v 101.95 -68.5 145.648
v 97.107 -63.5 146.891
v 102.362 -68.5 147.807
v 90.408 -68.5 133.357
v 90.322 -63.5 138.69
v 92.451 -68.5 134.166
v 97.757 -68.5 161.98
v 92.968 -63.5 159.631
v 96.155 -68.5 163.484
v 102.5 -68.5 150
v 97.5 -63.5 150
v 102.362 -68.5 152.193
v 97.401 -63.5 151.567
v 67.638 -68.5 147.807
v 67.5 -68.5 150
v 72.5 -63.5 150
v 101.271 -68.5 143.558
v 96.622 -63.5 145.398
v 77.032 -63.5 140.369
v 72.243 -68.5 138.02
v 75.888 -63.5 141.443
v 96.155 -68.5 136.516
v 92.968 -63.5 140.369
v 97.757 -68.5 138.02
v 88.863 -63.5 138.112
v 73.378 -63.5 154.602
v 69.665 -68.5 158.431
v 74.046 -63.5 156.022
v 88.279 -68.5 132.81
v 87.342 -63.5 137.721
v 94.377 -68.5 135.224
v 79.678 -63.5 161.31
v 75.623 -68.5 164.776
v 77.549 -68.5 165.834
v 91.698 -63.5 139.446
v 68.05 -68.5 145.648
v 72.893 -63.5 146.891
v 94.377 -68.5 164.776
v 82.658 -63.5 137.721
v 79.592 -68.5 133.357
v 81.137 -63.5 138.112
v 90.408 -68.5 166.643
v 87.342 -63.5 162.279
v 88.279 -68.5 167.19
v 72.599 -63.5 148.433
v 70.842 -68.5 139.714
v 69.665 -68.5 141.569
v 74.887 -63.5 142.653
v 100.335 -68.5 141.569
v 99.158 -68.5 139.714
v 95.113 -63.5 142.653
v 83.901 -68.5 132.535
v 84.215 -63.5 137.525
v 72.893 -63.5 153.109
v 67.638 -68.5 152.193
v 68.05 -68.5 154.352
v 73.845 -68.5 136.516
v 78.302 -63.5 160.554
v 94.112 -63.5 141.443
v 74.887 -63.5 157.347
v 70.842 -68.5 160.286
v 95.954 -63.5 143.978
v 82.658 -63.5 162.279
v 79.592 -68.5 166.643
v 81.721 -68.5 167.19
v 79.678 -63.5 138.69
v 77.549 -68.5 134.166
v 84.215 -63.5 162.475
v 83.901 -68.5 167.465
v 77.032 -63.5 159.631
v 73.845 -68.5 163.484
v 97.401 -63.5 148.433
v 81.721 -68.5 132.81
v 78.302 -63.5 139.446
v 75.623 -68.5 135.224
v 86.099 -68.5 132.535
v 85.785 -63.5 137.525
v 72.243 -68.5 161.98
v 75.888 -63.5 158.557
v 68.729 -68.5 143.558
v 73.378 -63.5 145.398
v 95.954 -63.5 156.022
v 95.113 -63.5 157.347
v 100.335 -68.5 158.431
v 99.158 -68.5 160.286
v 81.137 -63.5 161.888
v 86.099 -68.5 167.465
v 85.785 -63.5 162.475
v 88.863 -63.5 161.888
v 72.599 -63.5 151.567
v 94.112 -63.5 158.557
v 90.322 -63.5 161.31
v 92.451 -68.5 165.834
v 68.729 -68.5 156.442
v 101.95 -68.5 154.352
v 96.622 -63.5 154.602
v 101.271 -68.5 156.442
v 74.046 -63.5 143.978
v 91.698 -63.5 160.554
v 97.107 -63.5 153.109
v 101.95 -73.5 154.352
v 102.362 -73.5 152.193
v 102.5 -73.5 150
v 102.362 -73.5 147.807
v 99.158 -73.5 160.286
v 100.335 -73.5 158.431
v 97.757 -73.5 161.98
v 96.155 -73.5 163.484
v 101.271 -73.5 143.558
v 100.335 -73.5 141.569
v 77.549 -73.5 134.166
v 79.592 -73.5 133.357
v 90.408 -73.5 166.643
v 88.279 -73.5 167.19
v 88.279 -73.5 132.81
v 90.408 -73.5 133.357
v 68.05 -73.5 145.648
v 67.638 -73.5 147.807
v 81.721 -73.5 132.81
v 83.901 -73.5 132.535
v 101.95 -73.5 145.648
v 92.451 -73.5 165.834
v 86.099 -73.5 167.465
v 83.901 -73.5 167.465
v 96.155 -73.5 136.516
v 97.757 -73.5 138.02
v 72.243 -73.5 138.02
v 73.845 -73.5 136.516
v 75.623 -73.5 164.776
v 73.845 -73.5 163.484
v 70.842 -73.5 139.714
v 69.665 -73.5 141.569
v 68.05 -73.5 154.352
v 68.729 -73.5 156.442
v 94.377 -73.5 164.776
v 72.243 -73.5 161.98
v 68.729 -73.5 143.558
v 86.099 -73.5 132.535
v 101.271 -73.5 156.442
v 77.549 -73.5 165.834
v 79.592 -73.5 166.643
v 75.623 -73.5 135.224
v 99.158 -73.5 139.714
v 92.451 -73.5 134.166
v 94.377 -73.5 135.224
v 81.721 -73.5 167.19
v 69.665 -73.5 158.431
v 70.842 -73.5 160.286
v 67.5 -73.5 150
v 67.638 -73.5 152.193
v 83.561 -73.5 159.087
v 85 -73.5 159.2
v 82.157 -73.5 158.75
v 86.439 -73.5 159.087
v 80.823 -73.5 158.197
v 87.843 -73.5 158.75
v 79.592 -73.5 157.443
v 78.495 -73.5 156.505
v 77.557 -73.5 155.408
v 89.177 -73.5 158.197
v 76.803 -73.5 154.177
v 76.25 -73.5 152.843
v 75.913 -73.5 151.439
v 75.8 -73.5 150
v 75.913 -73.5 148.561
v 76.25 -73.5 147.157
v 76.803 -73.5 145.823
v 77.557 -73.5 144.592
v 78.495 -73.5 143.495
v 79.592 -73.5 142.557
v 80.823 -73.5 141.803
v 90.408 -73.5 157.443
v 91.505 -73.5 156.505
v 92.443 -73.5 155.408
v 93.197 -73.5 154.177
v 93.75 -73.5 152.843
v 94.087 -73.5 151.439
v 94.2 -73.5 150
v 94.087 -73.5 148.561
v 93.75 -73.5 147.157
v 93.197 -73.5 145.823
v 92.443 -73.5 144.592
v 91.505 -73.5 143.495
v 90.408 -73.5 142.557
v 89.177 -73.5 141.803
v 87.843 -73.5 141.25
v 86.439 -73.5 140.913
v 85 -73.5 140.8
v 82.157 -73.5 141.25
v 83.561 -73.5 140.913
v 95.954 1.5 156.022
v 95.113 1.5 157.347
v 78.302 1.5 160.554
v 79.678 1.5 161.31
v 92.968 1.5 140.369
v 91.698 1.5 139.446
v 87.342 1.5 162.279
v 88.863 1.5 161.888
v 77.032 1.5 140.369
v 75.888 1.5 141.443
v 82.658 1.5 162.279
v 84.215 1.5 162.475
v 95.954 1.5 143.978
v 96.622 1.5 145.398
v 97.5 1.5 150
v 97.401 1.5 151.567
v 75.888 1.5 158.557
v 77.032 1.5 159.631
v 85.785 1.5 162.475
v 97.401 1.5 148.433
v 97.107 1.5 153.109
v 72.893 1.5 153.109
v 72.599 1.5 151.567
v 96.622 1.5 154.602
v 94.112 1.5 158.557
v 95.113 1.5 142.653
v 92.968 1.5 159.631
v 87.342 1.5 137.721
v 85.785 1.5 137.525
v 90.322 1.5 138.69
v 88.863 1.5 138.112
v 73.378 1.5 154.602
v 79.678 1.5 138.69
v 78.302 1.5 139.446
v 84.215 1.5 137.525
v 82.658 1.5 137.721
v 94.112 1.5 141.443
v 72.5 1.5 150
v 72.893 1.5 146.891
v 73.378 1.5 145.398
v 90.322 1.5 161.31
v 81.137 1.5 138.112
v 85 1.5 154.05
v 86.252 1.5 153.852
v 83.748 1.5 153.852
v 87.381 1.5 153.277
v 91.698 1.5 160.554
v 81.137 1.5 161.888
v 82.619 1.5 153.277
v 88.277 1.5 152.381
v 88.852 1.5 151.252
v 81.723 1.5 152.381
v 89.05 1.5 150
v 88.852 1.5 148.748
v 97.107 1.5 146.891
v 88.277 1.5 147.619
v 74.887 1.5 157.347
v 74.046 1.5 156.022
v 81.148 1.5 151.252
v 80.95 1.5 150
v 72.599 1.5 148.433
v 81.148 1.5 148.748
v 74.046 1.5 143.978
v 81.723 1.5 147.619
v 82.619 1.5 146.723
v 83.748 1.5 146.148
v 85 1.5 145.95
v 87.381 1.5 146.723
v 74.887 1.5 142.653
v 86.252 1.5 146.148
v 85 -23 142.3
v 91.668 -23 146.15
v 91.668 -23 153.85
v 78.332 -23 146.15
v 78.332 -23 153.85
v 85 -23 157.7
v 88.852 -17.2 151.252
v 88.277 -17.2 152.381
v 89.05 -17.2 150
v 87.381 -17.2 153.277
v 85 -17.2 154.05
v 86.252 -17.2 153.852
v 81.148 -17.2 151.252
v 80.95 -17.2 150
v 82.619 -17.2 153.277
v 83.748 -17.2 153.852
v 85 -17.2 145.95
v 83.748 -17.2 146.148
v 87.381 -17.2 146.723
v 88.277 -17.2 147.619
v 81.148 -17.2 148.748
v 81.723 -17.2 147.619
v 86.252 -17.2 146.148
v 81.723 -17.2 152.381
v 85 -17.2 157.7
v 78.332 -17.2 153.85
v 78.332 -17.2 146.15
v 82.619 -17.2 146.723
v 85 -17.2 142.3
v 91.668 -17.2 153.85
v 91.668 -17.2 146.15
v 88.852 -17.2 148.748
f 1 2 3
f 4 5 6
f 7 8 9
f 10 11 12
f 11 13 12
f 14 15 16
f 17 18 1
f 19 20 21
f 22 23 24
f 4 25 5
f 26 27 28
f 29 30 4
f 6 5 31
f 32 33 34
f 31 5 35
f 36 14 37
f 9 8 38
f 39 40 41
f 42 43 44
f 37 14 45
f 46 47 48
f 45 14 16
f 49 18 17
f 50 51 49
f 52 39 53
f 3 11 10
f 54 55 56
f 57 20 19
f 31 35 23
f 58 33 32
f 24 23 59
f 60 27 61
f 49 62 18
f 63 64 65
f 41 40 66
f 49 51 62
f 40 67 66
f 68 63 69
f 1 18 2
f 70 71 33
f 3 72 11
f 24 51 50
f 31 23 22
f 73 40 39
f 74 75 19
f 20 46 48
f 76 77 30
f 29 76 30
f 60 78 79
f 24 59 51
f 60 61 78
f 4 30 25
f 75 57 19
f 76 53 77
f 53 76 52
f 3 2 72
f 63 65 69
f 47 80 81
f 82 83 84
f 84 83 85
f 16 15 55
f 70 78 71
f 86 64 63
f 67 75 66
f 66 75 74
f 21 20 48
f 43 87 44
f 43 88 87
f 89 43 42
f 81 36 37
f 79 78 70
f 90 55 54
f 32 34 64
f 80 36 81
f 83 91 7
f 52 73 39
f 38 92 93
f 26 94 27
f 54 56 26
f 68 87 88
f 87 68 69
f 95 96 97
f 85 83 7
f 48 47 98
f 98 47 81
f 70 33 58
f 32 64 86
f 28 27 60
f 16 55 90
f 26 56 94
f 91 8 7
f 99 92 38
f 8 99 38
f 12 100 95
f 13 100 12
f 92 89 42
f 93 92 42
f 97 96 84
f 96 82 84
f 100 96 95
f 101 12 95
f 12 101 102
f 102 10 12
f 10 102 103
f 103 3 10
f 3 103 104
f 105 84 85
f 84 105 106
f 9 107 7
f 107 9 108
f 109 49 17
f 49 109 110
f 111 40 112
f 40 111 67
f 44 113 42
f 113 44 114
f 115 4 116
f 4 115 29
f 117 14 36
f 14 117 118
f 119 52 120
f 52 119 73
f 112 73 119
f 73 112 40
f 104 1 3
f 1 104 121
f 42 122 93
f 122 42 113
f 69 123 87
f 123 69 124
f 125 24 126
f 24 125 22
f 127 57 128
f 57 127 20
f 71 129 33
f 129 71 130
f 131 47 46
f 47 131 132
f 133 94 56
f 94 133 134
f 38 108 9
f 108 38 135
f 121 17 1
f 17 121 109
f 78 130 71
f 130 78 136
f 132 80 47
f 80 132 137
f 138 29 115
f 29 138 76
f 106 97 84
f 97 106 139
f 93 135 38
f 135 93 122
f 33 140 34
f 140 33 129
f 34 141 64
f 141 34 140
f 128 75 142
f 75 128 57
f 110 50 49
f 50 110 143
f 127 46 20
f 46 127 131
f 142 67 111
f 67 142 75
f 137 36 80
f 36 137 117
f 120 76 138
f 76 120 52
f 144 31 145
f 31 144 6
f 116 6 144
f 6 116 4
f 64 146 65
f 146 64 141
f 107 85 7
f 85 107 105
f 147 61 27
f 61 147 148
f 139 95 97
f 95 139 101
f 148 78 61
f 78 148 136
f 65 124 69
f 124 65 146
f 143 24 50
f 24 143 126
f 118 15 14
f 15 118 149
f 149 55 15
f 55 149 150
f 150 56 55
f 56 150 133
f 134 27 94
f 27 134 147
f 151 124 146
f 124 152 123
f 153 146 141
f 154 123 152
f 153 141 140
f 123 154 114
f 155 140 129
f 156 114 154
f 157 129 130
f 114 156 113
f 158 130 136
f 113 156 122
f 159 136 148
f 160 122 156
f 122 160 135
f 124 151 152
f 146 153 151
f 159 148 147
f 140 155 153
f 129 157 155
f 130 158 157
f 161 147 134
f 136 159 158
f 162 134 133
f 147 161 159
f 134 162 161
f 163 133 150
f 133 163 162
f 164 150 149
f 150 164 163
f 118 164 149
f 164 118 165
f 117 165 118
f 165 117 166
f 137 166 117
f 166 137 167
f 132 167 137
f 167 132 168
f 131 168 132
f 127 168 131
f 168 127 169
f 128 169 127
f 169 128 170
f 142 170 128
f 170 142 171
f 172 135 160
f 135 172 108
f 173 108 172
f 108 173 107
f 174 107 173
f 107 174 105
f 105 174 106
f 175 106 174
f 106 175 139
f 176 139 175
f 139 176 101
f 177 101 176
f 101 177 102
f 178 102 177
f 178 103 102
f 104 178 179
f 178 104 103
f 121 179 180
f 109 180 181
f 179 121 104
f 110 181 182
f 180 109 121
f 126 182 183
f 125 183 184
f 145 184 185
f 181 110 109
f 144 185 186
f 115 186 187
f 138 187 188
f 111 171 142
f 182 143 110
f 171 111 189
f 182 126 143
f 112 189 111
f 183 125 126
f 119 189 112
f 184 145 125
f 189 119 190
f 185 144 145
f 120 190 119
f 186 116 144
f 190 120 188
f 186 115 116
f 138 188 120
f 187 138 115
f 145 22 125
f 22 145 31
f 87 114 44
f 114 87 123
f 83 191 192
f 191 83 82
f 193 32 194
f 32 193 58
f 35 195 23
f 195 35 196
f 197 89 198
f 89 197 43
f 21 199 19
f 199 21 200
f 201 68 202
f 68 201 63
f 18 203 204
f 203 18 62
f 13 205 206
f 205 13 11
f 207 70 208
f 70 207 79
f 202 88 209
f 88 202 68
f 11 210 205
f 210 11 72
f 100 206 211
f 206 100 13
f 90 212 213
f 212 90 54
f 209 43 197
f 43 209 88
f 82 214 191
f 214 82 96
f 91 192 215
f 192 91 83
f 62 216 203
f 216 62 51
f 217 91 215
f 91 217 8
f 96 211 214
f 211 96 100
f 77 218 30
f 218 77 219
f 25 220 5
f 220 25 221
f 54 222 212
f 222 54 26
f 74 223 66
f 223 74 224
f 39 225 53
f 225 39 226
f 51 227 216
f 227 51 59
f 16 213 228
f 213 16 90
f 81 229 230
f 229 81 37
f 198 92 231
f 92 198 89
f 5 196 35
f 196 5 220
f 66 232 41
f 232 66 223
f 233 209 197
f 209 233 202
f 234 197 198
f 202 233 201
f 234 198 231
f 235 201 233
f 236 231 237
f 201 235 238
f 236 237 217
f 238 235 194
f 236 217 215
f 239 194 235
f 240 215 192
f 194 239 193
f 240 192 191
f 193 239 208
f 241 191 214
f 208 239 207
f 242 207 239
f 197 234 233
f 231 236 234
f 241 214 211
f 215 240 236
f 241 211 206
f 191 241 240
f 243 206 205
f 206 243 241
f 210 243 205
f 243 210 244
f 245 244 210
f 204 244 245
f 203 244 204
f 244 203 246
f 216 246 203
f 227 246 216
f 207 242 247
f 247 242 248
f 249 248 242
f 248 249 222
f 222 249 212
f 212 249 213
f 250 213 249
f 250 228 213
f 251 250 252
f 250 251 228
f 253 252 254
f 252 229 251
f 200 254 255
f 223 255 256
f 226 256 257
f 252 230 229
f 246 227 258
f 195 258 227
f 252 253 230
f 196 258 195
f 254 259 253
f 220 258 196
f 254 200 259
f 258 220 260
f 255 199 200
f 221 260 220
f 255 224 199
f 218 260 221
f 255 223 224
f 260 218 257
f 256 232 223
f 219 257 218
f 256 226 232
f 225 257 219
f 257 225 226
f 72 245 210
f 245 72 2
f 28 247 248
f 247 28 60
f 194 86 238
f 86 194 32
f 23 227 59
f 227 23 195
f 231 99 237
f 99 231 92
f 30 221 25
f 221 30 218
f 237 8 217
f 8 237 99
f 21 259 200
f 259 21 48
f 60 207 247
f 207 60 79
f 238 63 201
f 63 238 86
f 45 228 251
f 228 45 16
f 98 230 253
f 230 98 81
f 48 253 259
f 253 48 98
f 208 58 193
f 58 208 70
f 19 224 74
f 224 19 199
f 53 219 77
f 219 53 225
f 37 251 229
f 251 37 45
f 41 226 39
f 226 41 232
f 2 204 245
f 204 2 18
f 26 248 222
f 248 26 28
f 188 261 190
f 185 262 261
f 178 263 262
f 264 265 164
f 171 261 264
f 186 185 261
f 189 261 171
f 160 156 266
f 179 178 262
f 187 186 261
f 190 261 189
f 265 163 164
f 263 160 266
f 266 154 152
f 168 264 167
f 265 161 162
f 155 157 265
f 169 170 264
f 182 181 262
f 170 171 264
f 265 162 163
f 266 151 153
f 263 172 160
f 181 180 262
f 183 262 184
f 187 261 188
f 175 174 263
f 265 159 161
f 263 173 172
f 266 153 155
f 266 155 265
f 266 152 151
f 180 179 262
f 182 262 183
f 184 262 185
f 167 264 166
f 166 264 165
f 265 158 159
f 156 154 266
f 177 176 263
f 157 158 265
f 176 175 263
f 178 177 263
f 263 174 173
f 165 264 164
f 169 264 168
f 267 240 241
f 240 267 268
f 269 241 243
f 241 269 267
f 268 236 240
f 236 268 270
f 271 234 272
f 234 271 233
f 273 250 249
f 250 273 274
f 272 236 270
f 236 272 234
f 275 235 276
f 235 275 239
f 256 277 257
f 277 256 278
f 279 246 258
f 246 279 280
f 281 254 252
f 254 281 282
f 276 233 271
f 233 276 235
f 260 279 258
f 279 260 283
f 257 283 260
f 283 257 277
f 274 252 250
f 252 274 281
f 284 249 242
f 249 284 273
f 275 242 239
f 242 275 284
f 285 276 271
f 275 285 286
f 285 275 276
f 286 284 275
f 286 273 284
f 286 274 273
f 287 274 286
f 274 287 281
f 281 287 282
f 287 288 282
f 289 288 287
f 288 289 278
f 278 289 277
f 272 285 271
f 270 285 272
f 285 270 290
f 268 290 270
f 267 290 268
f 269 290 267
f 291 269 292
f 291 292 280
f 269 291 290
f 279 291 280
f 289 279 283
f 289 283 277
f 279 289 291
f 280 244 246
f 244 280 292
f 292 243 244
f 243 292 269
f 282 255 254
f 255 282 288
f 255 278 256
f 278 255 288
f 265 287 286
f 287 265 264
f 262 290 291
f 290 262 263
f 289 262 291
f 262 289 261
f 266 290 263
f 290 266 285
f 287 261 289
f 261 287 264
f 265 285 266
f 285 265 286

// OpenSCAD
include <spool_holder.scad>;
use <spool_holder.scad>;

SPOOL_MOUNT_HW = M8;
SPOOL_MOUNT_HW_LEN = 47;

BOLT_SIZE=M8;

difference(){
    union(){
            // jaw model (lower part)
            *translate([0,ARM_BASE_W,0]) base(display_jaw=true);
            // base model(upper part)
            *translate([0,ARM_BASE_W,0]) base(display_base=true);
            // arm model
            *arm(
                dual_spool=true,
                display="arm",
                spool_bolt_size=SPOOL_MOUNT_HW,
                spool_bolt_len=SPOOL_MOUNT_HW_LEN);
            // left spool holder
            arm(
                dual_spool=false,
                display="single_spool",
                spool_bolt_size=SPOOL_MOUNT_HW,
                spool_bolt_len=SPOOL_MOUNT_HW_LEN);
            
            
        }
    //using joining hardware
    for (i=[10, 30]){
        translate([10, 0, i])
            rotate([270, 30, 0])
                bolt_nut(CONN_BOLT_LEN , BOLT_SIZE, flip=false);
    }
}
